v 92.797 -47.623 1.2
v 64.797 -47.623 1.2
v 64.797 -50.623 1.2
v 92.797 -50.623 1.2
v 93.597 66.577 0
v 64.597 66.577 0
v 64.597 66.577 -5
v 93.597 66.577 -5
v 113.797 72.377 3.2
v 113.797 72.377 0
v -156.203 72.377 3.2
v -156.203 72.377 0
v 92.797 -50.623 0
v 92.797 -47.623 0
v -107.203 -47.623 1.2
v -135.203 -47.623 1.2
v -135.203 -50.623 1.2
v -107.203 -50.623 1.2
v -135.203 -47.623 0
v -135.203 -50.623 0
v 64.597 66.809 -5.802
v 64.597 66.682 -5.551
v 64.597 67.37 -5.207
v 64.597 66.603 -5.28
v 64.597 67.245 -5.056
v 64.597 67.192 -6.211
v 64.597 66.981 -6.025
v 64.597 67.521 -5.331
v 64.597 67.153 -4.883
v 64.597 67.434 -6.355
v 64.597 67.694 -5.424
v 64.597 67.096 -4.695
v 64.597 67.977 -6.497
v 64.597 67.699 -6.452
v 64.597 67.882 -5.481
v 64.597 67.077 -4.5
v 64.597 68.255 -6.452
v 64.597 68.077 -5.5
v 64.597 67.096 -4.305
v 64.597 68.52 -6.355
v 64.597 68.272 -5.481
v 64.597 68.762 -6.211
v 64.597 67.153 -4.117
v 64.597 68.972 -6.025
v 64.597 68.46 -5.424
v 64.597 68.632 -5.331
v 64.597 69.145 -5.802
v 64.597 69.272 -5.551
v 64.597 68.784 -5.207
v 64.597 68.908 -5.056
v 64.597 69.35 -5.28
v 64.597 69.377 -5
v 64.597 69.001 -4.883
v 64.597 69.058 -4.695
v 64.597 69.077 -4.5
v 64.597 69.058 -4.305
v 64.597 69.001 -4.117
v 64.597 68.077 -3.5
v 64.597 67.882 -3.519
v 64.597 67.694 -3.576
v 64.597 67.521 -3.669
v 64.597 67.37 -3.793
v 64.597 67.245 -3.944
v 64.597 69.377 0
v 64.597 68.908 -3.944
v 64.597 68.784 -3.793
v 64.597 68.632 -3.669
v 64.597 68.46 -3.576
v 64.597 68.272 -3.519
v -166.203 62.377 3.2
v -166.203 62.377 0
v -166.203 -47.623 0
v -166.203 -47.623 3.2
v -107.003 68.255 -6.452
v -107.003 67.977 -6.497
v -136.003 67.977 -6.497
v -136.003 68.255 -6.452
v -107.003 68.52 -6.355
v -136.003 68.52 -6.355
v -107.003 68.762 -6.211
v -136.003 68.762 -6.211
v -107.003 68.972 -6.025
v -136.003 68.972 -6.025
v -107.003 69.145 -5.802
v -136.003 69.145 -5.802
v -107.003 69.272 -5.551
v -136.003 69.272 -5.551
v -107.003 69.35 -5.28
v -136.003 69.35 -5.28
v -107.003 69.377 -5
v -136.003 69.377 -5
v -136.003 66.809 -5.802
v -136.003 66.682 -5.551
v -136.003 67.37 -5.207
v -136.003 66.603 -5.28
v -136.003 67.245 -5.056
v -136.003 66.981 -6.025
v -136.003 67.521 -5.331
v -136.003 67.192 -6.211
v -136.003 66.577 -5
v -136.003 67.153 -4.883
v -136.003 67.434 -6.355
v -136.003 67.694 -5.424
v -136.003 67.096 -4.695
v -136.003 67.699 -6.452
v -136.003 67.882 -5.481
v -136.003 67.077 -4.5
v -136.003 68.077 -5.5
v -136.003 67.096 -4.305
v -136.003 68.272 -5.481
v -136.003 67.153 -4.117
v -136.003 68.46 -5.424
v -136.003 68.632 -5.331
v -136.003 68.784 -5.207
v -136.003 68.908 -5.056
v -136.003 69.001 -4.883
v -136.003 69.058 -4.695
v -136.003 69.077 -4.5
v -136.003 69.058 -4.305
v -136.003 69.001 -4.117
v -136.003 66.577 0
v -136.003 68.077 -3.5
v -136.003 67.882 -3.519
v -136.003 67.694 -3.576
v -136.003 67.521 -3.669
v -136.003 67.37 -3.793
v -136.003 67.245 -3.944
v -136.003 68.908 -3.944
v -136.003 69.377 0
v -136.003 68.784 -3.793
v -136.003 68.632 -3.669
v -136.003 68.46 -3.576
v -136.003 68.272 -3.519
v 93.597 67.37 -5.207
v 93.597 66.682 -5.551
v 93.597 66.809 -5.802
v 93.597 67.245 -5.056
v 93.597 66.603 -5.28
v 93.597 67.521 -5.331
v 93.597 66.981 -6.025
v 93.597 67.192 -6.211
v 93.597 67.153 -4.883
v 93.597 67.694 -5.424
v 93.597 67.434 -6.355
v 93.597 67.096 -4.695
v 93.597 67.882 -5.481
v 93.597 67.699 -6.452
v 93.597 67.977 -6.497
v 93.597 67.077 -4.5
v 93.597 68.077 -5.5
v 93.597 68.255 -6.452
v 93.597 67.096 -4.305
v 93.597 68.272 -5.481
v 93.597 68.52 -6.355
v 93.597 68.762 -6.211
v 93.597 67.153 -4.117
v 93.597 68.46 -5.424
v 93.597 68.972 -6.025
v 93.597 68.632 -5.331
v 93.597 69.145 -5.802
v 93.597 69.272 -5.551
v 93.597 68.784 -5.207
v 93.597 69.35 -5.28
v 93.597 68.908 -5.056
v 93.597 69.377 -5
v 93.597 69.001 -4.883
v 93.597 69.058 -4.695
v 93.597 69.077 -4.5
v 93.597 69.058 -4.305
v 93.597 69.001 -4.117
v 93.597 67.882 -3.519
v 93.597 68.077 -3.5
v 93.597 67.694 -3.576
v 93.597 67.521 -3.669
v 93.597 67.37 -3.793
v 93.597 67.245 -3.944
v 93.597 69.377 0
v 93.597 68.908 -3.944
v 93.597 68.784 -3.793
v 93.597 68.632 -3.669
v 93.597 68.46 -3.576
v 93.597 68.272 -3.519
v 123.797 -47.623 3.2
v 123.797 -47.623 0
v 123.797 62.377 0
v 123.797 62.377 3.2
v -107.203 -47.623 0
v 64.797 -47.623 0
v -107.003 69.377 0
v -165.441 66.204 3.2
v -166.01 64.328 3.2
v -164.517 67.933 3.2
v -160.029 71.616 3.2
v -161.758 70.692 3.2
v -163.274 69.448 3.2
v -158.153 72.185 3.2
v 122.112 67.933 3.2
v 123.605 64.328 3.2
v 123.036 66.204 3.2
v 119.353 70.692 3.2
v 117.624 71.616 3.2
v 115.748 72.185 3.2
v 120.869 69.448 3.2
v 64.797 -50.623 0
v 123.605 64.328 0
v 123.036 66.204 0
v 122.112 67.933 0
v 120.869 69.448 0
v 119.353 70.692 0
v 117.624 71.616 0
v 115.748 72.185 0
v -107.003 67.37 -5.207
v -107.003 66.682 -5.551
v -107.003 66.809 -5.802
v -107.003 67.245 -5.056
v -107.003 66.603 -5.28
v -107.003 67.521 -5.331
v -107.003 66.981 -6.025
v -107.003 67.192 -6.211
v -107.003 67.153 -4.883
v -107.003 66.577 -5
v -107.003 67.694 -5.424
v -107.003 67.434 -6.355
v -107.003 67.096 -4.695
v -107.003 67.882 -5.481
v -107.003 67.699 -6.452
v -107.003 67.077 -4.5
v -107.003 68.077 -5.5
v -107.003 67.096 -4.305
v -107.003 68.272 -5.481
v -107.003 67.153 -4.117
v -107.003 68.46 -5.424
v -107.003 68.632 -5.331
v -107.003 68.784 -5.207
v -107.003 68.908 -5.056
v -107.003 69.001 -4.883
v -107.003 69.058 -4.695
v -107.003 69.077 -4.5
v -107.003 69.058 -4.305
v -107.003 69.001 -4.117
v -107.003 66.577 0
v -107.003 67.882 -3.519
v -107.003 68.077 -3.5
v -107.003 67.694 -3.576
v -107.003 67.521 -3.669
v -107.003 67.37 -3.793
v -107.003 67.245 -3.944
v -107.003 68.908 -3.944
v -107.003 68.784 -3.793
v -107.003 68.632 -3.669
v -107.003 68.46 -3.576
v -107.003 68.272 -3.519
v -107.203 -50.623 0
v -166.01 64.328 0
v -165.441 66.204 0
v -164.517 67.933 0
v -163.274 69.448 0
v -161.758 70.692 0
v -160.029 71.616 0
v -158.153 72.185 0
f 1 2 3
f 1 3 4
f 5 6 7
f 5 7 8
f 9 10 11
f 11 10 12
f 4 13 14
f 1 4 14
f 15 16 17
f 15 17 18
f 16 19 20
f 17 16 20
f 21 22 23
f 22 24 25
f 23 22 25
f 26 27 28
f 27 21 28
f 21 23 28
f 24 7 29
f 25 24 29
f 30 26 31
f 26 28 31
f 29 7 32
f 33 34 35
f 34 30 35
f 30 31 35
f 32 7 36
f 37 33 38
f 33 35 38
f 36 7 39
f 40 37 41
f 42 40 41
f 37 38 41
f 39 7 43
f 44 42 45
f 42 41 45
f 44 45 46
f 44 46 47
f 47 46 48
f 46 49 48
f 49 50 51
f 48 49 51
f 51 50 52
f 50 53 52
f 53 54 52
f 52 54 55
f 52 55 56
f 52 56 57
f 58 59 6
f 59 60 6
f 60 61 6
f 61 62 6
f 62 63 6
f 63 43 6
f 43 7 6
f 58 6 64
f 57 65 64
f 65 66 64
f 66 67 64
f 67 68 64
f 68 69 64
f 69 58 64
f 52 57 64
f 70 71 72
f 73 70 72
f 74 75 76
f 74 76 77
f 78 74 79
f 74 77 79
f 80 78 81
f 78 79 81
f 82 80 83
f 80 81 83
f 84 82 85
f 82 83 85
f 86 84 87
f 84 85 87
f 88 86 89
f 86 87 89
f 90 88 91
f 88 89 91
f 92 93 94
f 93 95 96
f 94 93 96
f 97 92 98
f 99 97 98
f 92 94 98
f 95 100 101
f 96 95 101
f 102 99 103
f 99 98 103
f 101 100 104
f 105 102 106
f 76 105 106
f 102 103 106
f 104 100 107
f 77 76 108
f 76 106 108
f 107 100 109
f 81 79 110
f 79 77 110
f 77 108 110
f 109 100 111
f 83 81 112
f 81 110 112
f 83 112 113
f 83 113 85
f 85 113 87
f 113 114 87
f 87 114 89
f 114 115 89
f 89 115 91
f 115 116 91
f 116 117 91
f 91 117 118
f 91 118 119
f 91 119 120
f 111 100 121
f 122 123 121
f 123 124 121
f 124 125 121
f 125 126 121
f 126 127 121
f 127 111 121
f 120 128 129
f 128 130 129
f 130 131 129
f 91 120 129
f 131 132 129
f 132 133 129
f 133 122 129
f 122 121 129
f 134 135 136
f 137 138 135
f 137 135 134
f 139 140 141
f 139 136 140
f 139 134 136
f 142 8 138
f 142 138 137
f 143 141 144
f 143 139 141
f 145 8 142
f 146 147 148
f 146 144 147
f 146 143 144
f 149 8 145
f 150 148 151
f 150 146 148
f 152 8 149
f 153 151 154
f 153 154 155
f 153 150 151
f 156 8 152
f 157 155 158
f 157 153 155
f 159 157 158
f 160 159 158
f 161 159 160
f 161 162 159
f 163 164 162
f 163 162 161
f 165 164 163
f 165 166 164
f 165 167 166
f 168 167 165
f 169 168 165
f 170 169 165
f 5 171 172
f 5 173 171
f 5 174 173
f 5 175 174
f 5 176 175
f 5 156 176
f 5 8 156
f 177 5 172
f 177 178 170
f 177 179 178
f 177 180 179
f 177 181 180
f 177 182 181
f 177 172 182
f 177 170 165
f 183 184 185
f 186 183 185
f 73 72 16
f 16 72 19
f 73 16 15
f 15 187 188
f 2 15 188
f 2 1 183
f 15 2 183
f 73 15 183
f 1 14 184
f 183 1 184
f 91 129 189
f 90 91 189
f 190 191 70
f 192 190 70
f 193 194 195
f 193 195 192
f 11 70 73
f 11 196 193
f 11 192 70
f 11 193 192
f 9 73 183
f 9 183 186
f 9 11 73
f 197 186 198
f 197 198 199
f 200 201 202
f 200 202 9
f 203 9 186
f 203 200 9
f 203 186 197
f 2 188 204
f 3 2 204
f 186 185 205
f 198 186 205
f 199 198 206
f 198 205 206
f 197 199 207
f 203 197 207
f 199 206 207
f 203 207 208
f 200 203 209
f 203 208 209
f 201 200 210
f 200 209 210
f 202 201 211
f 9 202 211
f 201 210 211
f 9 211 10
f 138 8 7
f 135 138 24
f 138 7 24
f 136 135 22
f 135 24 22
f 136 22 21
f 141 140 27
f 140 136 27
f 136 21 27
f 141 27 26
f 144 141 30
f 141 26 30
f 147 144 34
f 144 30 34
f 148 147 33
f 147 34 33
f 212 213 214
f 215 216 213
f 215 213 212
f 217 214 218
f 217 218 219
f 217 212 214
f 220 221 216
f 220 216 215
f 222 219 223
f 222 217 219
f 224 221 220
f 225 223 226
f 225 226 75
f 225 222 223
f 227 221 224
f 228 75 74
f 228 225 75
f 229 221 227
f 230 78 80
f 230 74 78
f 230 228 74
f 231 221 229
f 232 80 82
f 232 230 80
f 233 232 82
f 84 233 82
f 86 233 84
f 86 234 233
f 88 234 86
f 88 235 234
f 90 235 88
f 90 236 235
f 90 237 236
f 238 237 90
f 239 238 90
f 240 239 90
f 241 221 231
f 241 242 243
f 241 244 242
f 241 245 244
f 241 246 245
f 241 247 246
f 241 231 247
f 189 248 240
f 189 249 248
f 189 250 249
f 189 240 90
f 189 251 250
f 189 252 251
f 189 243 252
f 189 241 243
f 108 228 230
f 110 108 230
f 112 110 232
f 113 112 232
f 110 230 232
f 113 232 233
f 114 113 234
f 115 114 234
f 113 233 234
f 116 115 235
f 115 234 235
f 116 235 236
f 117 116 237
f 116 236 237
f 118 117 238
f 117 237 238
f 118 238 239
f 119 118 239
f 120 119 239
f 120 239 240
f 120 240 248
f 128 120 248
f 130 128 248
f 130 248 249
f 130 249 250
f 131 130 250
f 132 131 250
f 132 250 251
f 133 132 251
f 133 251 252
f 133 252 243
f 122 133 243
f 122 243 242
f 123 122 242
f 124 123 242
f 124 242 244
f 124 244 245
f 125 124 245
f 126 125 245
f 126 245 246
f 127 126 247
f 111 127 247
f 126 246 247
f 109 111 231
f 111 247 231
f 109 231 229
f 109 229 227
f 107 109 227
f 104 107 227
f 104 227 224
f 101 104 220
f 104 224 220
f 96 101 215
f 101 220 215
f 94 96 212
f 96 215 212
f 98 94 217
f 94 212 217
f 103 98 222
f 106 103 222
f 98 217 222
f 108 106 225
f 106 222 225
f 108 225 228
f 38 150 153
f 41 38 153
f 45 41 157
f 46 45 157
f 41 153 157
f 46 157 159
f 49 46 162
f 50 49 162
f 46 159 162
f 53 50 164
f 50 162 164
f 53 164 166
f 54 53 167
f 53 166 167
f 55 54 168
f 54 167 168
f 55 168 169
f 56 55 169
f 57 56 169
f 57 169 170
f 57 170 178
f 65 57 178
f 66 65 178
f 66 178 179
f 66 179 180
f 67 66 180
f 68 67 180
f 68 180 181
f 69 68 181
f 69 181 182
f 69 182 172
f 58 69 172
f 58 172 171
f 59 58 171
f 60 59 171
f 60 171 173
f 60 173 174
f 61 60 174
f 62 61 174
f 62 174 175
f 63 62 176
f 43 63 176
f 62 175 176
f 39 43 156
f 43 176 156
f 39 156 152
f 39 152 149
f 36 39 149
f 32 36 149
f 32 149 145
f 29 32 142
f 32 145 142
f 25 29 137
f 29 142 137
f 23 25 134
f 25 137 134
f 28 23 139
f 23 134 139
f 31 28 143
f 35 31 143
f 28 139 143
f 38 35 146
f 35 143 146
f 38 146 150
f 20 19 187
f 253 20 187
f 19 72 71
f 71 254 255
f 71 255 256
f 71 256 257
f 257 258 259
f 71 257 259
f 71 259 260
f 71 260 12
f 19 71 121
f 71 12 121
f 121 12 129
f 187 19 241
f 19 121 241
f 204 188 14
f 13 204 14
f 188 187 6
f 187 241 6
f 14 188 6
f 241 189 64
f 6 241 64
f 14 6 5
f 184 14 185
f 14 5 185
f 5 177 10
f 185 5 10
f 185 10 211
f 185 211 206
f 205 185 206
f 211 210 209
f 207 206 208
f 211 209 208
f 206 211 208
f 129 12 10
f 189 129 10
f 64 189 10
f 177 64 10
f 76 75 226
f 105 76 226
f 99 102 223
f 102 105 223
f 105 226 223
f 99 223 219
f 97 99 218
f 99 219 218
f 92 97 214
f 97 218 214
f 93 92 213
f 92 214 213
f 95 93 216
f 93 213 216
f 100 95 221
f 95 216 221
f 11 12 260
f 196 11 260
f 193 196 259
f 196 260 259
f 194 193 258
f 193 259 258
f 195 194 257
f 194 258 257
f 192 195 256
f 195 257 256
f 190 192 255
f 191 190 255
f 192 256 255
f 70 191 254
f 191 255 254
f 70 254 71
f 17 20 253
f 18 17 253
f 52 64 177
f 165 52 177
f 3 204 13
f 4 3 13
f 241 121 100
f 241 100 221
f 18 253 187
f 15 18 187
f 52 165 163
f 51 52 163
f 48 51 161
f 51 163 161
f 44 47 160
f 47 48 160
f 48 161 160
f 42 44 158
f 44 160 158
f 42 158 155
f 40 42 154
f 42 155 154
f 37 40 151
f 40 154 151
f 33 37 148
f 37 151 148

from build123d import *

# Parameters (mm, degrees)
EXTRUDE_1_DEPTH     = 3.2
SKETCH_2_W          = 28
SKETCH_2_H          = 3
CUT_EXTRUDE_1_DEPTH = 2
SKETCH_3_W          = 29
SKETCH_3_H          = 2.8
EXTRUDE_2_DEPTH     = 6.5
SKETCH_4_R          = 1
CUT_EXTRUDE_2_DEPTH = 270.771576627
FILLET_1_R          = 1.5


with BuildPart() as part:
    # 草图1 → 凸台-拉伸1 (new body)
    with BuildSketch(Plane.XY):
        with BuildLine():
            Line((-107.202531646, -47.623114492), (64.797468354, -47.623114492))
            Line((64.797468354, -47.623114492), (64.797468354, -50.623114492))
            Line((64.797468354, -50.623114492), (92.797468354, -50.623114492))
            Line((92.797468354, -50.623114492), (92.797468354, -47.623114492))
            Line((92.797468354, -47.623114492), (123.797468354, -47.623114492))
            Line((123.797468354, -47.623114492), (123.797468354, 62.376885508))
            ThreePointArc((123.797468354, 62.376885508), (120.868536166, 69.447953319), (113.797468354, 72.376885508))
            Line((113.797468354, 72.376885508), (-156.202531646, 72.376885508))
            ThreePointArc((-156.202531646, 72.376885508), (-163.273599457, 69.447953319), (-166.202531646, 62.376885508))
            Line((-166.202531646, 62.376885508), (-166.202531646, -47.623114492))
            Line((-166.202531646, -47.623114492), (-135.202531646, -47.623114492))
            Line((-135.202531646, -47.623114492), (-135.202531646, -50.623114492))
            Line((-135.202531646, -50.623114492), (-107.202531646, -50.623114492))
            Line((-107.202531646, -50.623114492), (-107.202531646, -47.623114492))
        make_face()
    extrude(amount=EXTRUDE_1_DEPTH)

    # 草图2 → 切除-拉伸1 (cut)
    with BuildSketch(Plane.XY.offset(3.2)):
        with Locations((-121.202531646, -49.123114492)):
            Rectangle(SKETCH_2_W, SKETCH_2_H)
        with Locations((78.797468354, -49.123114492)):
            Rectangle(SKETCH_2_W, SKETCH_2_H)
    extrude(amount=-CUT_EXTRUDE_1_DEPTH, mode=Mode.SUBTRACT)

    # 草图3 → 凸台-拉伸2 (add)
    with BuildSketch(Plane.XY):
        with Locations((-121.502531646, 67.976885508)):
            Rectangle(SKETCH_3_W, SKETCH_3_H)
        with Locations((79.097468354, 67.976885508)):
            Rectangle(SKETCH_3_W, SKETCH_3_H)
    extrude(amount=-EXTRUDE_2_DEPTH)

    # 草图4 → 切除-拉伸2 (cut, through all)
    with BuildSketch(Plane(origin=(93.597468354, 0, 0), x_dir=(0, 0, -1), z_dir=(1, 0, 0))):
        with Locations((4.5, 68.076885508)):
            Circle(SKETCH_4_R)
    extrude(amount=-CUT_EXTRUDE_2_DEPTH, mode=Mode.SUBTRACT)

    # 圆角1
    # the kernel refuses this fillet: 1.5 mm, written as the material it takes off along each edge
    with BuildSketch(Plane(origin=(60.847468354, 66.576885508, -6.5), x_dir=(0, 0, 1), z_dir=(1, 0, 0)), Plane(origin=(97.347468354, 69.376885508, -6.5), x_dir=(0, 0, 1), z_dir=(-1, 0, 0))) as fillet_1_piece_1:
        with BuildLine():
            CenterArc((FILLET_1_R, -FILLET_1_R), FILLET_1_R, 90, 90)
            Line((0, -FILLET_1_R), (0, 0))
            Line((0, 0), (FILLET_1_R, 0))
        make_face()
    extrude(amount=36.5, mode=Mode.SUBTRACT)
    with BuildSketch(Plane(origin=(-103.252531646, 66.576885508, -6.5), x_dir=(0, 0, 1), z_dir=(-1, 0, 0)), Plane(origin=(-139.752531646, 69.376885508, -6.5), x_dir=(0, 0, 1), z_dir=(1, 0, 0))) as fillet_1_piece_2:
        with BuildLine():
            CenterArc((FILLET_1_R, FILLET_1_R), FILLET_1_R, 180, 90)
            Line((0, FILLET_1_R), (0, 0))
            Line((0, 0), (FILLET_1_R, 0))
        make_face()
    extrude(amount=36.5, mode=Mode.SUBTRACT)


solid = part.part
